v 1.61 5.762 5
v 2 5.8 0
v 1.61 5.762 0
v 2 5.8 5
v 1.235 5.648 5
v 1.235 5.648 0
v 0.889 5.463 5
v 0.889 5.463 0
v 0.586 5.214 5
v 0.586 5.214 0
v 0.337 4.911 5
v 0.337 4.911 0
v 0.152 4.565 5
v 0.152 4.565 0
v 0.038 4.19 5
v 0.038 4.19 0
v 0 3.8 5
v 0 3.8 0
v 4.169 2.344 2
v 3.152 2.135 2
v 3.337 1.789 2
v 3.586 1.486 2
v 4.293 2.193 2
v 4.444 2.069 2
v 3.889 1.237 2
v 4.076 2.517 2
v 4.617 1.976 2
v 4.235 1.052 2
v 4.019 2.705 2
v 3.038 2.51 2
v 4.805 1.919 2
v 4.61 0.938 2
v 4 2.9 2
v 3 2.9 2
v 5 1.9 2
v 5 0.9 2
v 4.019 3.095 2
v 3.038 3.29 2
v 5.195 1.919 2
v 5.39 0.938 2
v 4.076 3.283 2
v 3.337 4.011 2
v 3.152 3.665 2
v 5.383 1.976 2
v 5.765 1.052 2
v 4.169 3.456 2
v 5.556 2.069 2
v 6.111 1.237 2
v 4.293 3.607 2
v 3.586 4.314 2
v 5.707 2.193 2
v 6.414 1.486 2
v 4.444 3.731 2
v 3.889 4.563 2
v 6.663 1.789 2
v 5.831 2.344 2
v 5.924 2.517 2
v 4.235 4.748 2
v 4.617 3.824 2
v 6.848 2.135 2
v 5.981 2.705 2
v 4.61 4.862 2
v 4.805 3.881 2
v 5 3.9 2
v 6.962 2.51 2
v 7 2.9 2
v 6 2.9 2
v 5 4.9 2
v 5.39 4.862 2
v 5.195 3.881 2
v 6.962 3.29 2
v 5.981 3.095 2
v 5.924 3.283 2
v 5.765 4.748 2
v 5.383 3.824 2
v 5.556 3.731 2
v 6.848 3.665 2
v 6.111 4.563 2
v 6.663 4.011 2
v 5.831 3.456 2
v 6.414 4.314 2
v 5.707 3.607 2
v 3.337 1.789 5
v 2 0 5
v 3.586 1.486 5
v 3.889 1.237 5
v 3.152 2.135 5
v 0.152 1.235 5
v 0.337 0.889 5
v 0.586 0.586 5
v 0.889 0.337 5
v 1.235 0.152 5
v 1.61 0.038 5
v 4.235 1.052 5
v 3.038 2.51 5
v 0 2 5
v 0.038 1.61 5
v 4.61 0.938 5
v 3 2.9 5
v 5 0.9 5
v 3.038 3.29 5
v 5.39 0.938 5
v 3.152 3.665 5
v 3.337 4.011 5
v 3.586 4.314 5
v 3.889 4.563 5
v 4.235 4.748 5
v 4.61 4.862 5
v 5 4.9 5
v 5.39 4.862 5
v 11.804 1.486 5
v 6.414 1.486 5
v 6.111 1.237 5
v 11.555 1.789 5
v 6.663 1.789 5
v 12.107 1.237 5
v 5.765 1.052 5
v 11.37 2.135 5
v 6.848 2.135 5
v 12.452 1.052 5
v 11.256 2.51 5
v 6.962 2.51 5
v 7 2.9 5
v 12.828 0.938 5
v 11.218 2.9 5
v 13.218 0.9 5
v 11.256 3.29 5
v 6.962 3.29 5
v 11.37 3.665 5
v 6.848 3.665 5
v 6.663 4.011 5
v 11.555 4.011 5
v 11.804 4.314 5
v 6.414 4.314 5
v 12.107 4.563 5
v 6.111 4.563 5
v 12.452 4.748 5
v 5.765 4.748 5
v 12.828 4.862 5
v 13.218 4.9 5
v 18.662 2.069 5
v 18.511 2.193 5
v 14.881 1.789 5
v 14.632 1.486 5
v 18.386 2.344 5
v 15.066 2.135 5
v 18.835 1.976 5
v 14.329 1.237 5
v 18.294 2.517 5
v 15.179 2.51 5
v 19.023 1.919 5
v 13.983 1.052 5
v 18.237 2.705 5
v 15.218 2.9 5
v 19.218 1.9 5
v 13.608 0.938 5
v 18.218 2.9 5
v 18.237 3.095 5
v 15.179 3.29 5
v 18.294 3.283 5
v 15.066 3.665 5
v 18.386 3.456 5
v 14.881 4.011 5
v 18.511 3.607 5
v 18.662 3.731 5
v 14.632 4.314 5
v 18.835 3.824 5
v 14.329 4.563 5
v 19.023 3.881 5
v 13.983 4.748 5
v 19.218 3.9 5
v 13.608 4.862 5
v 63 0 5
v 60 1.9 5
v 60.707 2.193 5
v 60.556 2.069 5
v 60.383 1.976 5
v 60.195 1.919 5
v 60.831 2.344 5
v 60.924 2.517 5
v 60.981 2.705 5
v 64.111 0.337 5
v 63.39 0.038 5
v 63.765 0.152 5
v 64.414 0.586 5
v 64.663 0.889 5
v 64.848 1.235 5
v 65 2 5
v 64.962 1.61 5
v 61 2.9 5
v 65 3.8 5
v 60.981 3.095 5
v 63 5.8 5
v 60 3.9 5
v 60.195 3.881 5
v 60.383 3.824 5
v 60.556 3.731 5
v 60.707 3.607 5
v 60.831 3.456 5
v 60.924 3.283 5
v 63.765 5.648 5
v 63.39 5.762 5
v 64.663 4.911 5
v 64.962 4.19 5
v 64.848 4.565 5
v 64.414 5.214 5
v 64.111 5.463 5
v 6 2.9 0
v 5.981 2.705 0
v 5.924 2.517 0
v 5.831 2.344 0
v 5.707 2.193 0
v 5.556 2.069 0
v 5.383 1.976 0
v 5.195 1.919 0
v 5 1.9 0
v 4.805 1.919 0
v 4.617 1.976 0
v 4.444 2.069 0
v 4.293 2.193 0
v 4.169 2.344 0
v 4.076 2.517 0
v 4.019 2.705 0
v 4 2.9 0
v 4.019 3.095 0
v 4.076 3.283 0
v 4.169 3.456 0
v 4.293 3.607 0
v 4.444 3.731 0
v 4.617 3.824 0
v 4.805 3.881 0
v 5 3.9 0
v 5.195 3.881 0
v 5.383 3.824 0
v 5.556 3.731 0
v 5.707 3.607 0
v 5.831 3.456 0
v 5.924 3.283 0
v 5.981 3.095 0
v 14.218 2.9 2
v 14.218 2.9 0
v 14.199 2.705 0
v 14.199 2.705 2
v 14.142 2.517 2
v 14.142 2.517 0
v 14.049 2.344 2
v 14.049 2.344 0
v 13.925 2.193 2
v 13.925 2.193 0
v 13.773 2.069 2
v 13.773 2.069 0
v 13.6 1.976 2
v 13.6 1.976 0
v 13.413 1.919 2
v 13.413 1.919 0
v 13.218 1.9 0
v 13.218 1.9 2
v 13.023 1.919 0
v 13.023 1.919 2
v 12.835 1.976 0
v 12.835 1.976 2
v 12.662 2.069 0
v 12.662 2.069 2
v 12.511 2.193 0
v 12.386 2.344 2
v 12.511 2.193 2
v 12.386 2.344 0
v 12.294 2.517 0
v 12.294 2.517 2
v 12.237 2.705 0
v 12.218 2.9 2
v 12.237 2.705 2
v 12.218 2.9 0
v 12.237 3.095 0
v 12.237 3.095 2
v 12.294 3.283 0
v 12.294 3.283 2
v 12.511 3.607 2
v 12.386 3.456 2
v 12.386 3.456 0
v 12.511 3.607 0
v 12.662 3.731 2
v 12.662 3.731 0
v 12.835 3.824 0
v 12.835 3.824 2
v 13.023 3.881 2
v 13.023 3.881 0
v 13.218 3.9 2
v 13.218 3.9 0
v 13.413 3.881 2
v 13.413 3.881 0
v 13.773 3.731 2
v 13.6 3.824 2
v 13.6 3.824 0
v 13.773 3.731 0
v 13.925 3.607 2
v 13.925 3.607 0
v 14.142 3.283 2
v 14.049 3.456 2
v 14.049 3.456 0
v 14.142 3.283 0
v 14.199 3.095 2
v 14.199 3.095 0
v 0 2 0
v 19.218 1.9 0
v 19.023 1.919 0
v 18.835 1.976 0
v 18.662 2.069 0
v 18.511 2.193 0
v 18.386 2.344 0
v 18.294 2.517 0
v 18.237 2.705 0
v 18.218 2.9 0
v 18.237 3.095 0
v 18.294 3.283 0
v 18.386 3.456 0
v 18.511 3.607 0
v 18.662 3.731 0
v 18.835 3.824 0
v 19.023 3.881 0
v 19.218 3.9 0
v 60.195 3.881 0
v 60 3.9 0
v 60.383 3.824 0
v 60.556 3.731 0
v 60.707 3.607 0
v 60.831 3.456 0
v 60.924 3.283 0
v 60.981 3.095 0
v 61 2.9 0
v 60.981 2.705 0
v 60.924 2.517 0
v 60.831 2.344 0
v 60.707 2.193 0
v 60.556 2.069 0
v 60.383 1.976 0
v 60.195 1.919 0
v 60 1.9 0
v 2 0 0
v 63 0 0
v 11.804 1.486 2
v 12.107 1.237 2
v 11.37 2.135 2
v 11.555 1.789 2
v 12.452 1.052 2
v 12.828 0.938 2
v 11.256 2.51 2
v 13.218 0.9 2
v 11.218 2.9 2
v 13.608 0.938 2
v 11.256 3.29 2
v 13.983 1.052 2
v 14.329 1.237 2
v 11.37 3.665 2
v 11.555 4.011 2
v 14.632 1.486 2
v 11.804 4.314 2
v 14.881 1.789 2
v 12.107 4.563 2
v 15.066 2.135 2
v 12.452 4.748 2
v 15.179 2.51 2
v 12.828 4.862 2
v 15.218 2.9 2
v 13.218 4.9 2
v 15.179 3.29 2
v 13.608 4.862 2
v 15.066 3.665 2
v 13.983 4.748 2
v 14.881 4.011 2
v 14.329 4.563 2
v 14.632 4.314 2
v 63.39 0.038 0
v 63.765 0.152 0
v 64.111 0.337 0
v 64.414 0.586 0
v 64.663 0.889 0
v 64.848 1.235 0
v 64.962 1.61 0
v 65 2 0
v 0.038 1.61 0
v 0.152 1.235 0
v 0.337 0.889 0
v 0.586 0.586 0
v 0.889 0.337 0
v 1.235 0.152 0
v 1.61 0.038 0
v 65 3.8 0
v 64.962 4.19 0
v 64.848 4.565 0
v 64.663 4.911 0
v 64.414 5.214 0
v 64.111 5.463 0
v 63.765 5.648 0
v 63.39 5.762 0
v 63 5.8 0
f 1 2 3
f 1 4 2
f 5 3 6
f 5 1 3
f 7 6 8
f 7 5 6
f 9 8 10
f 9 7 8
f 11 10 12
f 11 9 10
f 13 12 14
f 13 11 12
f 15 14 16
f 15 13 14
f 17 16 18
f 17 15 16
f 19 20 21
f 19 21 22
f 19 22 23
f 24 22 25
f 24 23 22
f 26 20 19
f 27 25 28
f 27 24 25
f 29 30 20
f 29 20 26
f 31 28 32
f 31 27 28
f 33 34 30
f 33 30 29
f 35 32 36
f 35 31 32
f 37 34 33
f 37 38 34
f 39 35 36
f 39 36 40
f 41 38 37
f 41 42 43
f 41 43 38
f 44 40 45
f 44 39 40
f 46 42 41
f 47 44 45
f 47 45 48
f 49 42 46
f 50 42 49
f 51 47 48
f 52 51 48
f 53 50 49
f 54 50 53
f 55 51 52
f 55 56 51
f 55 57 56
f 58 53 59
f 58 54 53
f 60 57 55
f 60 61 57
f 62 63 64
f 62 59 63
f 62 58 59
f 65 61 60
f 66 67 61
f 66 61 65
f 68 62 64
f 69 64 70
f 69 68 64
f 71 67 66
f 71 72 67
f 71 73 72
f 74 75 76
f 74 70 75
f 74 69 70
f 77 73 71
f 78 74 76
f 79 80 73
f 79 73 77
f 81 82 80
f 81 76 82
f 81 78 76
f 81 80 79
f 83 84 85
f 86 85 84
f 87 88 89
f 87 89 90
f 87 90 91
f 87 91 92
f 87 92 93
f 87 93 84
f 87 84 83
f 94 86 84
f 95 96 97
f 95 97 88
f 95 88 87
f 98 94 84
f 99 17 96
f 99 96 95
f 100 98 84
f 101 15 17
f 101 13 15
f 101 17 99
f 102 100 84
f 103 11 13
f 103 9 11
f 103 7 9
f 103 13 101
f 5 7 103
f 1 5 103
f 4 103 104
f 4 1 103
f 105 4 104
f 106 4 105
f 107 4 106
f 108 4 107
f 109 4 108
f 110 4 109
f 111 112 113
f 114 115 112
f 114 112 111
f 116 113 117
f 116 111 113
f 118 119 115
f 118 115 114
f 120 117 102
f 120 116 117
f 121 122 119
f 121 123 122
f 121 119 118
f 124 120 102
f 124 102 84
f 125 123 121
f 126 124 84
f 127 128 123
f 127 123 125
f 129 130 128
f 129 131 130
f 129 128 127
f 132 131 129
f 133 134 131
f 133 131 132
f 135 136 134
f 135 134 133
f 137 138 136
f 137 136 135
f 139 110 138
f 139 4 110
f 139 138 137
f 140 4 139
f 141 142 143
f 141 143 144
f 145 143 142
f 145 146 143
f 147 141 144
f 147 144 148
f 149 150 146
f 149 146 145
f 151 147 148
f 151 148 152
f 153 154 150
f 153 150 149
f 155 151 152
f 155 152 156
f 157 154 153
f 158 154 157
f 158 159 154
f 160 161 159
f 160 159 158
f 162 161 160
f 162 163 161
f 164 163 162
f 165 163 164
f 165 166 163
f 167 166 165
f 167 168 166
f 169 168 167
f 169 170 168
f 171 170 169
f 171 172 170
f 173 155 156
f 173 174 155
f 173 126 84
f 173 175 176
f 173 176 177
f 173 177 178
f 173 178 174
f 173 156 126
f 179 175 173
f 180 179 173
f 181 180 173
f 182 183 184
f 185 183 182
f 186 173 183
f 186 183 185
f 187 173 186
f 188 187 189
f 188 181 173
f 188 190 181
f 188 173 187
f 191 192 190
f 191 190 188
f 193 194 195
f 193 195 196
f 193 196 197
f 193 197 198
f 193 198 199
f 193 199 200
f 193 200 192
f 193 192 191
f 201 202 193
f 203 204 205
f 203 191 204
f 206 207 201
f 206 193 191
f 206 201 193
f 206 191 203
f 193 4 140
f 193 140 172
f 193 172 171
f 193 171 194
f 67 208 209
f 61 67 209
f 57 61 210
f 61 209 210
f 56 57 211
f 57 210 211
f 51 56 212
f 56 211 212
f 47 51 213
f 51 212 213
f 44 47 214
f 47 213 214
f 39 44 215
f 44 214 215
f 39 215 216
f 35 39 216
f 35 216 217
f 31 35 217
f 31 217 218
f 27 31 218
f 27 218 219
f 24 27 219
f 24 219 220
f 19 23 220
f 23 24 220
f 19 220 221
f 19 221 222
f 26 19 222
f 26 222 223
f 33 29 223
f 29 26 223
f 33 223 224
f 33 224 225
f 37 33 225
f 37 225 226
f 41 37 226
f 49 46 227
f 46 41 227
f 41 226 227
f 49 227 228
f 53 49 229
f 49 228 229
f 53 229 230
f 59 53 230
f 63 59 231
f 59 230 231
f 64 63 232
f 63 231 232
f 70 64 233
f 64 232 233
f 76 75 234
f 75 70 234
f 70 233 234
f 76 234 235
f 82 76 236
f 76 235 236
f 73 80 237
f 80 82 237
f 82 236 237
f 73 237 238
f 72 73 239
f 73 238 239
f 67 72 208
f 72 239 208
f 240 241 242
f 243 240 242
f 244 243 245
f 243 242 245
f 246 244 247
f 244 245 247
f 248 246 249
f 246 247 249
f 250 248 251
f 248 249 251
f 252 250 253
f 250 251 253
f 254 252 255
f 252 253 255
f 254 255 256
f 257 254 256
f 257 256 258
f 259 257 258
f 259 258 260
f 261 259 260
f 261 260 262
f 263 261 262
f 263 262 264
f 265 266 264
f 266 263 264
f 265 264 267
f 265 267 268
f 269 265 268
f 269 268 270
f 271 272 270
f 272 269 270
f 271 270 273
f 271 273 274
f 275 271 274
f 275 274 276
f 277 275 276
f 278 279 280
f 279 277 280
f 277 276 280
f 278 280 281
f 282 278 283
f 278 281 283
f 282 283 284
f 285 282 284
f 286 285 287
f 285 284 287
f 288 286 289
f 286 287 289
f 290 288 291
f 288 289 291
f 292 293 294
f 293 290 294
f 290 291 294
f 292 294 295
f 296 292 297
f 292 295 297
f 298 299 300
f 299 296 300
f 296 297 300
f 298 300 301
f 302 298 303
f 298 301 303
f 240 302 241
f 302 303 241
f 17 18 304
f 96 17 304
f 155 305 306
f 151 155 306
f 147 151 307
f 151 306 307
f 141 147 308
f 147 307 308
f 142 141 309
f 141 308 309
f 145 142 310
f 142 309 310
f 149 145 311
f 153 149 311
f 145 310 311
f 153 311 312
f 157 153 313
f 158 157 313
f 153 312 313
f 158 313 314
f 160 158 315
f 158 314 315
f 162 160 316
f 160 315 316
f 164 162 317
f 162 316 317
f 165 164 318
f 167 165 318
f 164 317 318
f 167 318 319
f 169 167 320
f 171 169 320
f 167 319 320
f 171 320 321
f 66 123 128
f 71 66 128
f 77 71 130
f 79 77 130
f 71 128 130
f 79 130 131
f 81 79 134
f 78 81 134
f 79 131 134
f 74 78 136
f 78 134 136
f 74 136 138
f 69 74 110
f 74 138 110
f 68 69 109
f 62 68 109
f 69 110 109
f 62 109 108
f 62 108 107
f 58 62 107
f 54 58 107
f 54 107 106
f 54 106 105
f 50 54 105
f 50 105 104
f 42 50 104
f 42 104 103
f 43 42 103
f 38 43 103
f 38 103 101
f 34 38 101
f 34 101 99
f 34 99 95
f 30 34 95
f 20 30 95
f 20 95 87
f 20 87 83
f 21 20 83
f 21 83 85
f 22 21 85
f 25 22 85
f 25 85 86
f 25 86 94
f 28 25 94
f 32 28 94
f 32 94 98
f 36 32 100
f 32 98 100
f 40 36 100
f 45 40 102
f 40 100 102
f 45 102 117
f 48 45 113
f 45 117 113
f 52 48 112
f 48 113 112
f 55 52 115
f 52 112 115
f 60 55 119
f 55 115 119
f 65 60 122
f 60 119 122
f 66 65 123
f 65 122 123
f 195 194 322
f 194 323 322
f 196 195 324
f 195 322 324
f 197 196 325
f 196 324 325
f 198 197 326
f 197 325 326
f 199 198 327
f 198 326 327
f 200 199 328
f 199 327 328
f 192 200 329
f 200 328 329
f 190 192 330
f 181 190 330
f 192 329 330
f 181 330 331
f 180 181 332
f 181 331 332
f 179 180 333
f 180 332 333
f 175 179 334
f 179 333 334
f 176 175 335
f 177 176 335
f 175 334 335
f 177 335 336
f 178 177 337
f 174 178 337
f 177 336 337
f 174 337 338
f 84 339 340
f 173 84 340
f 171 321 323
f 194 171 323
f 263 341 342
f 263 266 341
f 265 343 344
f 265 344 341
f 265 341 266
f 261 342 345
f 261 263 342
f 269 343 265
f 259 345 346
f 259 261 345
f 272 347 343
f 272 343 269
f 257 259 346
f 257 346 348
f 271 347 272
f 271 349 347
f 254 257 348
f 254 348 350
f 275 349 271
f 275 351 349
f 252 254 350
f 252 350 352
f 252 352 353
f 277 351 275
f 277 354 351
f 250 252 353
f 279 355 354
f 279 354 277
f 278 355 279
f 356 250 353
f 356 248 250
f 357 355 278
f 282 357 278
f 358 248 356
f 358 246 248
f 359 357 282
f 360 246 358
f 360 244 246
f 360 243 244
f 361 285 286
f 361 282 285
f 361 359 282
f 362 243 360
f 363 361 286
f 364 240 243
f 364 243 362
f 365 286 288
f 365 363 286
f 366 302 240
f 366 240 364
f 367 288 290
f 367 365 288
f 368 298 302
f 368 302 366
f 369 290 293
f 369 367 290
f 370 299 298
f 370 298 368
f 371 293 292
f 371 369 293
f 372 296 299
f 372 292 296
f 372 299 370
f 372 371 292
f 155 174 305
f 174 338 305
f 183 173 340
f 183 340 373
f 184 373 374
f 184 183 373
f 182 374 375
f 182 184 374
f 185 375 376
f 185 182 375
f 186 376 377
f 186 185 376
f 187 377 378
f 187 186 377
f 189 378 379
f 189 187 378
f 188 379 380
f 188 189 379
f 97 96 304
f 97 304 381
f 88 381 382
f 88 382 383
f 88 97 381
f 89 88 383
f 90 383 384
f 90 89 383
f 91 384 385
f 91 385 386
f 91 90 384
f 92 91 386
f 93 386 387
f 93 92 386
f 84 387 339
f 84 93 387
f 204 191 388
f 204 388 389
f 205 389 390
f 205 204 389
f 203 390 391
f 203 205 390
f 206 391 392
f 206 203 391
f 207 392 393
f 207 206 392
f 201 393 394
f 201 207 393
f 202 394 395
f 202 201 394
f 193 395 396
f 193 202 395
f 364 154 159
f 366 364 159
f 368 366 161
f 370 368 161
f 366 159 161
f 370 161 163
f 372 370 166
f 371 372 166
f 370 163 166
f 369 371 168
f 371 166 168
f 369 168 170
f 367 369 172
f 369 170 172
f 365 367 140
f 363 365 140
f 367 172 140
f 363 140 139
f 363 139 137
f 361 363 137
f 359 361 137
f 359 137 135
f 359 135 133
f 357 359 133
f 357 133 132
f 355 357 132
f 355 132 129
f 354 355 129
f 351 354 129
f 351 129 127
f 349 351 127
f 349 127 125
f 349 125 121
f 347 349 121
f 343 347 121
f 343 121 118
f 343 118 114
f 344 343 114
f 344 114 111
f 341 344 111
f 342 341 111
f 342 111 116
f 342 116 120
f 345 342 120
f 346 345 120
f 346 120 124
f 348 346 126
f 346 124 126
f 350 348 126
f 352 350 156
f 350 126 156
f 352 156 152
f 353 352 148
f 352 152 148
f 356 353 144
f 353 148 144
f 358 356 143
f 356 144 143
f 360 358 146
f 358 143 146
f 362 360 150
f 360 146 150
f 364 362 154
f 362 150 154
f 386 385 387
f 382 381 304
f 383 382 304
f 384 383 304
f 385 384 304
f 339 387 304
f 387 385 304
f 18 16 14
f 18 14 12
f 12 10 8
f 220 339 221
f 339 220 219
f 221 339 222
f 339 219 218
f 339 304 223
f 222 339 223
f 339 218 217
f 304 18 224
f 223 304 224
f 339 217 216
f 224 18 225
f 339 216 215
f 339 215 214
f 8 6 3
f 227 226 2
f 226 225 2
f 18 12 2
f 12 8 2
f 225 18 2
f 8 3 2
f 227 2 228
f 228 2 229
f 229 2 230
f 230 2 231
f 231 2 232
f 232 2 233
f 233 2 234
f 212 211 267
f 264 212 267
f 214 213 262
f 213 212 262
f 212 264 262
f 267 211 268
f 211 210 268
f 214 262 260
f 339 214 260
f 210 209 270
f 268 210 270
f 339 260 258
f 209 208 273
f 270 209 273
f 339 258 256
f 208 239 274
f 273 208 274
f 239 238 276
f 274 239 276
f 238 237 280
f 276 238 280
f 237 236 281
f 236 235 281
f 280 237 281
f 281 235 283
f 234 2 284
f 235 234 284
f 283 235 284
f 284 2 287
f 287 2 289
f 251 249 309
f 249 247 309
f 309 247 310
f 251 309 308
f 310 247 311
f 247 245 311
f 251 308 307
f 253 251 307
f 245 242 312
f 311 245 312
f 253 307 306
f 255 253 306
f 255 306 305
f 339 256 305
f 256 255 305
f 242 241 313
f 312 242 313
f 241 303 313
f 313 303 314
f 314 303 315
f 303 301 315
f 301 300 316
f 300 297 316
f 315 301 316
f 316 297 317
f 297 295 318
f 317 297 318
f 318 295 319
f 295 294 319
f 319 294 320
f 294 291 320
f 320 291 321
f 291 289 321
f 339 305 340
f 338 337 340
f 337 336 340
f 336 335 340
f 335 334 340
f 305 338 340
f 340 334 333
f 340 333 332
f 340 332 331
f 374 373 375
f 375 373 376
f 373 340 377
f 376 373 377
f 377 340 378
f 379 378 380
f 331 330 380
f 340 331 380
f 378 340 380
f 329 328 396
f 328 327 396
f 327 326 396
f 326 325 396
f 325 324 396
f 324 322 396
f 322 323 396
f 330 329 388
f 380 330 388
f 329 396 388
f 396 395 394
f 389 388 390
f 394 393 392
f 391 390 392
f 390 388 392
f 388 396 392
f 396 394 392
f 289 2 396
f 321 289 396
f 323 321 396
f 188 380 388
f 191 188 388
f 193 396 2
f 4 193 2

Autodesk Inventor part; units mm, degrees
ref_plane "YZ Plane" through (0, 0, 0) normal (1, 0, 0) x (0, 1, 0)
ref_plane "XZ Plane" through (0, 0, 0) normal (0, 1, 0) x (-1, 0, 0)
ref_plane "XY Plane" through (0, 0, 0) normal (0, 0, 1) x (1, 0, 0)
sketch "Sketch1" plane through (0, 0, 0) normal (0, 0, 1) x (1, 0, 0)
  line L0 (0, 0) -> (65, 0)
  line L1 (65, 0) -> (65, 5.8)
  line L2 (65, 5.8) -> (0, 5.8)
  line L3 (0, 5.8) -> (0, 0)
  line L4 (0, 0) -> (0, 2.9)
  line L5 (0, 2.9) -> (5, 2.9)
  line L6 (5, 2.9) -> (13.2178, 2.9)
  circle A0 centre (5, 2.9) radius 1
  circle A1 centre (13.2178, 2.9) radius 1
  line L7 (13.2178, 2.9) -> (19.2178, 2.9)
  line L8 (19.2178, 2.9) -> (60, 2.9)
  circle A2 centre (19.2178, 2.9) radius 1
  circle A3 centre (60, 2.9) radius 1
  line L9 (19.2178, 3.9) -> (60, 3.9)
  line L10 (60, 1.9) -> (19.2178, 1.9)
  point P0 (65, 2.9)
  dimension "d0" = 65
  dimension "d1" = 5.8
  dimension "d2" = 2.9
  dimension "d3" = 5
  dimension "d4" = 8.2178
  dimension "d5" = 2
  dimension "d6" = 2
  dimension "d7" = 6
  dimension "d8" = 5
  dimension "d9" = 2
  dimension "d10" = 2
extrude "Extrusion1" add sketch "Sketch1" along normal blind 5
fillet "Fillet1" radius 2 4 edges at (0, 5.8, 2.5) (65, 5.8, 2.5) (65, 0, 2.5) (0, 0, 2.5)
sketch "Sketch2" plane through (0, 0, 5) normal (0, 0, 1) x (1, 0, 0)
  arc A0 (0, 2) -> (2, 0) centre (2, 2) ccw projected
  line L0 (2, 0) -> (63, 0) projected
  arc A1 (63, 0) -> (65, 2) centre (63, 2) ccw projected
  line L1 (65, 2) -> (65, 3.8) projected
  arc A2 (65, 3.8) -> (63, 5.8) centre (63, 3.8) ccw projected
  line L2 (63, 5.8) -> (2, 5.8) projected
  arc A3 (2, 5.8) -> (0, 3.8) centre (2, 3.8) ccw projected
  line L3 (0, 3.8) -> (0, 2) projected
  arc A4 (19.2178, 3.9) -> (19.2178, 1.9) centre (19.2178, 2.9) ccw projected
  line L4 (19.2178, 3.9) -> (60, 3.9) projected
  arc A5 (60, 1.9) -> (60, 3.9) centre (60, 2.9) ccw projected
  line L5 (60, 1.9) -> (19.2178, 1.9) projected
  circle A6 centre (13.2178, 2.9) radius 1 projected
  circle A7 centre (5, 2.9) radius 1 projected
  circle A8 centre (5, 2.9) radius 2
  circle A9 centre (13.2178, 2.9) radius 2
  point P0 (0, 0)
  dimension "d14" = 4
  dimension "d15" = 4
extrude "Extrusion2" cut sketch "Sketch2" against normal blind 3 contours A7 | A8 | A9
equation "\"d2\" = 0.5 * d1"
equation "\"d6\" = d5"
equation "\"d7\" = d8 + 0.5 * d5"
equation "\"d9\" = d5"
equation "\"d10\" = d5"
equation "\"d15\" = d14"
properties part number "Locking Lever"
